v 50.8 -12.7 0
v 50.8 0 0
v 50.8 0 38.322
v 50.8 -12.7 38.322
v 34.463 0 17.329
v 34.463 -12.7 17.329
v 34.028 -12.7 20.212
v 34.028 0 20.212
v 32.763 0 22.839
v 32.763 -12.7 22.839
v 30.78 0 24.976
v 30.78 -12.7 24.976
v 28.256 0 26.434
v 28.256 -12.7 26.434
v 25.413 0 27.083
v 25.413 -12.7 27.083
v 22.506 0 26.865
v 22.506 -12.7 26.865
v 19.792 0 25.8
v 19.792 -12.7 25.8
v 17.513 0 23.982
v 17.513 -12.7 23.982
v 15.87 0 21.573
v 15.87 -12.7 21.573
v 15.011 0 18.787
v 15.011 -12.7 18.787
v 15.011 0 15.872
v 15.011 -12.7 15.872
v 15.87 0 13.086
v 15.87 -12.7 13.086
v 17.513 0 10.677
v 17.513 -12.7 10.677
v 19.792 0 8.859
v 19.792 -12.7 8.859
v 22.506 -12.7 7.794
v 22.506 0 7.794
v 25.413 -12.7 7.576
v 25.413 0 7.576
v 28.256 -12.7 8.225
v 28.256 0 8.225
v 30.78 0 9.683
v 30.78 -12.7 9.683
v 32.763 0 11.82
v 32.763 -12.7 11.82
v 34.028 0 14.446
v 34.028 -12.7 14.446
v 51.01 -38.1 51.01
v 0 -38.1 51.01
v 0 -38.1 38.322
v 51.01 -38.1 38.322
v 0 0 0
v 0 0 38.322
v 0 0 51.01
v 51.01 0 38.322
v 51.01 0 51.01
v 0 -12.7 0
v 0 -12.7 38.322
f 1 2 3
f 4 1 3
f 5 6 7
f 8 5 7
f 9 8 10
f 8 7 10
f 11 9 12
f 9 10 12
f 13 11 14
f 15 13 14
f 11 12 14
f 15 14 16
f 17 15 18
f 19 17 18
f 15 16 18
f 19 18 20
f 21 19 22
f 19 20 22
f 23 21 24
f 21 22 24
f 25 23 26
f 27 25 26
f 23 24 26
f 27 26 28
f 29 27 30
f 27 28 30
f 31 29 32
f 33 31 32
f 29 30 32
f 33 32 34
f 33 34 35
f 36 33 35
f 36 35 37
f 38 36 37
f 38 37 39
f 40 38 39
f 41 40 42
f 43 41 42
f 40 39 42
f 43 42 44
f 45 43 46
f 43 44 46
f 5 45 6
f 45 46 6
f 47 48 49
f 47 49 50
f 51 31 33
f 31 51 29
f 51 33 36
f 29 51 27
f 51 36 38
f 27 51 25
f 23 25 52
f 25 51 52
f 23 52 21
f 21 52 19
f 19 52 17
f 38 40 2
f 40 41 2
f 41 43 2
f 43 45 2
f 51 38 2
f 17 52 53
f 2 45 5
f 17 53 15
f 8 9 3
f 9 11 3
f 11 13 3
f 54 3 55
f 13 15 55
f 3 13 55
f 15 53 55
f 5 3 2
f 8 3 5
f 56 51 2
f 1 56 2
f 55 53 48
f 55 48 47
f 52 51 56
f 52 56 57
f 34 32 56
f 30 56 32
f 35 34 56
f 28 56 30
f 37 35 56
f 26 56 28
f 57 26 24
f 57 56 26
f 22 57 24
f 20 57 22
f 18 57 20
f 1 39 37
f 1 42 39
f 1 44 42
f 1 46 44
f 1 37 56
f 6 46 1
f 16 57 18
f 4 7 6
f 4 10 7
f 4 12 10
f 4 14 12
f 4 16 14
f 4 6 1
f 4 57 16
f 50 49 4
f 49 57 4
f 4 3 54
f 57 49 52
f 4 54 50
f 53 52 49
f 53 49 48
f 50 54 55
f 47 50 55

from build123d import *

# Parameters (mm, degrees)
F0_W     = 50.8
F0_H     = 50.8
F1_DEPTH = 12.7
F2_W     = 51.009607
F2_H     = 12.687672
F3_DEPTH = 38.1
F4_R     = 9.780589
F5_DEPTH = 12.7


with BuildPart() as f1:
    # F0 (on Front) → F1 (new body)
    with BuildSketch(Plane.XZ):
        with Locations((25.4, 25.4)):
            Rectangle(F0_W, F0_H)
    extrude(amount=F1_DEPTH)

    # F2 (on Front) → F3 (join)
    with BuildSketch(Plane.XZ):
        with Locations((25.504803, 44.665778)):
            Rectangle(F2_W, F2_H)
    extrude(amount=F3_DEPTH)

    # F4 (on face) → F5 (cut, through all)
    with BuildSketch(Plane.XZ.offset(12.7)):
        with Locations((24.682367, 17.329346)):
            Circle(F4_R)
    extrude(amount=-F5_DEPTH, mode=Mode.SUBTRACT)


solid = f1.part
